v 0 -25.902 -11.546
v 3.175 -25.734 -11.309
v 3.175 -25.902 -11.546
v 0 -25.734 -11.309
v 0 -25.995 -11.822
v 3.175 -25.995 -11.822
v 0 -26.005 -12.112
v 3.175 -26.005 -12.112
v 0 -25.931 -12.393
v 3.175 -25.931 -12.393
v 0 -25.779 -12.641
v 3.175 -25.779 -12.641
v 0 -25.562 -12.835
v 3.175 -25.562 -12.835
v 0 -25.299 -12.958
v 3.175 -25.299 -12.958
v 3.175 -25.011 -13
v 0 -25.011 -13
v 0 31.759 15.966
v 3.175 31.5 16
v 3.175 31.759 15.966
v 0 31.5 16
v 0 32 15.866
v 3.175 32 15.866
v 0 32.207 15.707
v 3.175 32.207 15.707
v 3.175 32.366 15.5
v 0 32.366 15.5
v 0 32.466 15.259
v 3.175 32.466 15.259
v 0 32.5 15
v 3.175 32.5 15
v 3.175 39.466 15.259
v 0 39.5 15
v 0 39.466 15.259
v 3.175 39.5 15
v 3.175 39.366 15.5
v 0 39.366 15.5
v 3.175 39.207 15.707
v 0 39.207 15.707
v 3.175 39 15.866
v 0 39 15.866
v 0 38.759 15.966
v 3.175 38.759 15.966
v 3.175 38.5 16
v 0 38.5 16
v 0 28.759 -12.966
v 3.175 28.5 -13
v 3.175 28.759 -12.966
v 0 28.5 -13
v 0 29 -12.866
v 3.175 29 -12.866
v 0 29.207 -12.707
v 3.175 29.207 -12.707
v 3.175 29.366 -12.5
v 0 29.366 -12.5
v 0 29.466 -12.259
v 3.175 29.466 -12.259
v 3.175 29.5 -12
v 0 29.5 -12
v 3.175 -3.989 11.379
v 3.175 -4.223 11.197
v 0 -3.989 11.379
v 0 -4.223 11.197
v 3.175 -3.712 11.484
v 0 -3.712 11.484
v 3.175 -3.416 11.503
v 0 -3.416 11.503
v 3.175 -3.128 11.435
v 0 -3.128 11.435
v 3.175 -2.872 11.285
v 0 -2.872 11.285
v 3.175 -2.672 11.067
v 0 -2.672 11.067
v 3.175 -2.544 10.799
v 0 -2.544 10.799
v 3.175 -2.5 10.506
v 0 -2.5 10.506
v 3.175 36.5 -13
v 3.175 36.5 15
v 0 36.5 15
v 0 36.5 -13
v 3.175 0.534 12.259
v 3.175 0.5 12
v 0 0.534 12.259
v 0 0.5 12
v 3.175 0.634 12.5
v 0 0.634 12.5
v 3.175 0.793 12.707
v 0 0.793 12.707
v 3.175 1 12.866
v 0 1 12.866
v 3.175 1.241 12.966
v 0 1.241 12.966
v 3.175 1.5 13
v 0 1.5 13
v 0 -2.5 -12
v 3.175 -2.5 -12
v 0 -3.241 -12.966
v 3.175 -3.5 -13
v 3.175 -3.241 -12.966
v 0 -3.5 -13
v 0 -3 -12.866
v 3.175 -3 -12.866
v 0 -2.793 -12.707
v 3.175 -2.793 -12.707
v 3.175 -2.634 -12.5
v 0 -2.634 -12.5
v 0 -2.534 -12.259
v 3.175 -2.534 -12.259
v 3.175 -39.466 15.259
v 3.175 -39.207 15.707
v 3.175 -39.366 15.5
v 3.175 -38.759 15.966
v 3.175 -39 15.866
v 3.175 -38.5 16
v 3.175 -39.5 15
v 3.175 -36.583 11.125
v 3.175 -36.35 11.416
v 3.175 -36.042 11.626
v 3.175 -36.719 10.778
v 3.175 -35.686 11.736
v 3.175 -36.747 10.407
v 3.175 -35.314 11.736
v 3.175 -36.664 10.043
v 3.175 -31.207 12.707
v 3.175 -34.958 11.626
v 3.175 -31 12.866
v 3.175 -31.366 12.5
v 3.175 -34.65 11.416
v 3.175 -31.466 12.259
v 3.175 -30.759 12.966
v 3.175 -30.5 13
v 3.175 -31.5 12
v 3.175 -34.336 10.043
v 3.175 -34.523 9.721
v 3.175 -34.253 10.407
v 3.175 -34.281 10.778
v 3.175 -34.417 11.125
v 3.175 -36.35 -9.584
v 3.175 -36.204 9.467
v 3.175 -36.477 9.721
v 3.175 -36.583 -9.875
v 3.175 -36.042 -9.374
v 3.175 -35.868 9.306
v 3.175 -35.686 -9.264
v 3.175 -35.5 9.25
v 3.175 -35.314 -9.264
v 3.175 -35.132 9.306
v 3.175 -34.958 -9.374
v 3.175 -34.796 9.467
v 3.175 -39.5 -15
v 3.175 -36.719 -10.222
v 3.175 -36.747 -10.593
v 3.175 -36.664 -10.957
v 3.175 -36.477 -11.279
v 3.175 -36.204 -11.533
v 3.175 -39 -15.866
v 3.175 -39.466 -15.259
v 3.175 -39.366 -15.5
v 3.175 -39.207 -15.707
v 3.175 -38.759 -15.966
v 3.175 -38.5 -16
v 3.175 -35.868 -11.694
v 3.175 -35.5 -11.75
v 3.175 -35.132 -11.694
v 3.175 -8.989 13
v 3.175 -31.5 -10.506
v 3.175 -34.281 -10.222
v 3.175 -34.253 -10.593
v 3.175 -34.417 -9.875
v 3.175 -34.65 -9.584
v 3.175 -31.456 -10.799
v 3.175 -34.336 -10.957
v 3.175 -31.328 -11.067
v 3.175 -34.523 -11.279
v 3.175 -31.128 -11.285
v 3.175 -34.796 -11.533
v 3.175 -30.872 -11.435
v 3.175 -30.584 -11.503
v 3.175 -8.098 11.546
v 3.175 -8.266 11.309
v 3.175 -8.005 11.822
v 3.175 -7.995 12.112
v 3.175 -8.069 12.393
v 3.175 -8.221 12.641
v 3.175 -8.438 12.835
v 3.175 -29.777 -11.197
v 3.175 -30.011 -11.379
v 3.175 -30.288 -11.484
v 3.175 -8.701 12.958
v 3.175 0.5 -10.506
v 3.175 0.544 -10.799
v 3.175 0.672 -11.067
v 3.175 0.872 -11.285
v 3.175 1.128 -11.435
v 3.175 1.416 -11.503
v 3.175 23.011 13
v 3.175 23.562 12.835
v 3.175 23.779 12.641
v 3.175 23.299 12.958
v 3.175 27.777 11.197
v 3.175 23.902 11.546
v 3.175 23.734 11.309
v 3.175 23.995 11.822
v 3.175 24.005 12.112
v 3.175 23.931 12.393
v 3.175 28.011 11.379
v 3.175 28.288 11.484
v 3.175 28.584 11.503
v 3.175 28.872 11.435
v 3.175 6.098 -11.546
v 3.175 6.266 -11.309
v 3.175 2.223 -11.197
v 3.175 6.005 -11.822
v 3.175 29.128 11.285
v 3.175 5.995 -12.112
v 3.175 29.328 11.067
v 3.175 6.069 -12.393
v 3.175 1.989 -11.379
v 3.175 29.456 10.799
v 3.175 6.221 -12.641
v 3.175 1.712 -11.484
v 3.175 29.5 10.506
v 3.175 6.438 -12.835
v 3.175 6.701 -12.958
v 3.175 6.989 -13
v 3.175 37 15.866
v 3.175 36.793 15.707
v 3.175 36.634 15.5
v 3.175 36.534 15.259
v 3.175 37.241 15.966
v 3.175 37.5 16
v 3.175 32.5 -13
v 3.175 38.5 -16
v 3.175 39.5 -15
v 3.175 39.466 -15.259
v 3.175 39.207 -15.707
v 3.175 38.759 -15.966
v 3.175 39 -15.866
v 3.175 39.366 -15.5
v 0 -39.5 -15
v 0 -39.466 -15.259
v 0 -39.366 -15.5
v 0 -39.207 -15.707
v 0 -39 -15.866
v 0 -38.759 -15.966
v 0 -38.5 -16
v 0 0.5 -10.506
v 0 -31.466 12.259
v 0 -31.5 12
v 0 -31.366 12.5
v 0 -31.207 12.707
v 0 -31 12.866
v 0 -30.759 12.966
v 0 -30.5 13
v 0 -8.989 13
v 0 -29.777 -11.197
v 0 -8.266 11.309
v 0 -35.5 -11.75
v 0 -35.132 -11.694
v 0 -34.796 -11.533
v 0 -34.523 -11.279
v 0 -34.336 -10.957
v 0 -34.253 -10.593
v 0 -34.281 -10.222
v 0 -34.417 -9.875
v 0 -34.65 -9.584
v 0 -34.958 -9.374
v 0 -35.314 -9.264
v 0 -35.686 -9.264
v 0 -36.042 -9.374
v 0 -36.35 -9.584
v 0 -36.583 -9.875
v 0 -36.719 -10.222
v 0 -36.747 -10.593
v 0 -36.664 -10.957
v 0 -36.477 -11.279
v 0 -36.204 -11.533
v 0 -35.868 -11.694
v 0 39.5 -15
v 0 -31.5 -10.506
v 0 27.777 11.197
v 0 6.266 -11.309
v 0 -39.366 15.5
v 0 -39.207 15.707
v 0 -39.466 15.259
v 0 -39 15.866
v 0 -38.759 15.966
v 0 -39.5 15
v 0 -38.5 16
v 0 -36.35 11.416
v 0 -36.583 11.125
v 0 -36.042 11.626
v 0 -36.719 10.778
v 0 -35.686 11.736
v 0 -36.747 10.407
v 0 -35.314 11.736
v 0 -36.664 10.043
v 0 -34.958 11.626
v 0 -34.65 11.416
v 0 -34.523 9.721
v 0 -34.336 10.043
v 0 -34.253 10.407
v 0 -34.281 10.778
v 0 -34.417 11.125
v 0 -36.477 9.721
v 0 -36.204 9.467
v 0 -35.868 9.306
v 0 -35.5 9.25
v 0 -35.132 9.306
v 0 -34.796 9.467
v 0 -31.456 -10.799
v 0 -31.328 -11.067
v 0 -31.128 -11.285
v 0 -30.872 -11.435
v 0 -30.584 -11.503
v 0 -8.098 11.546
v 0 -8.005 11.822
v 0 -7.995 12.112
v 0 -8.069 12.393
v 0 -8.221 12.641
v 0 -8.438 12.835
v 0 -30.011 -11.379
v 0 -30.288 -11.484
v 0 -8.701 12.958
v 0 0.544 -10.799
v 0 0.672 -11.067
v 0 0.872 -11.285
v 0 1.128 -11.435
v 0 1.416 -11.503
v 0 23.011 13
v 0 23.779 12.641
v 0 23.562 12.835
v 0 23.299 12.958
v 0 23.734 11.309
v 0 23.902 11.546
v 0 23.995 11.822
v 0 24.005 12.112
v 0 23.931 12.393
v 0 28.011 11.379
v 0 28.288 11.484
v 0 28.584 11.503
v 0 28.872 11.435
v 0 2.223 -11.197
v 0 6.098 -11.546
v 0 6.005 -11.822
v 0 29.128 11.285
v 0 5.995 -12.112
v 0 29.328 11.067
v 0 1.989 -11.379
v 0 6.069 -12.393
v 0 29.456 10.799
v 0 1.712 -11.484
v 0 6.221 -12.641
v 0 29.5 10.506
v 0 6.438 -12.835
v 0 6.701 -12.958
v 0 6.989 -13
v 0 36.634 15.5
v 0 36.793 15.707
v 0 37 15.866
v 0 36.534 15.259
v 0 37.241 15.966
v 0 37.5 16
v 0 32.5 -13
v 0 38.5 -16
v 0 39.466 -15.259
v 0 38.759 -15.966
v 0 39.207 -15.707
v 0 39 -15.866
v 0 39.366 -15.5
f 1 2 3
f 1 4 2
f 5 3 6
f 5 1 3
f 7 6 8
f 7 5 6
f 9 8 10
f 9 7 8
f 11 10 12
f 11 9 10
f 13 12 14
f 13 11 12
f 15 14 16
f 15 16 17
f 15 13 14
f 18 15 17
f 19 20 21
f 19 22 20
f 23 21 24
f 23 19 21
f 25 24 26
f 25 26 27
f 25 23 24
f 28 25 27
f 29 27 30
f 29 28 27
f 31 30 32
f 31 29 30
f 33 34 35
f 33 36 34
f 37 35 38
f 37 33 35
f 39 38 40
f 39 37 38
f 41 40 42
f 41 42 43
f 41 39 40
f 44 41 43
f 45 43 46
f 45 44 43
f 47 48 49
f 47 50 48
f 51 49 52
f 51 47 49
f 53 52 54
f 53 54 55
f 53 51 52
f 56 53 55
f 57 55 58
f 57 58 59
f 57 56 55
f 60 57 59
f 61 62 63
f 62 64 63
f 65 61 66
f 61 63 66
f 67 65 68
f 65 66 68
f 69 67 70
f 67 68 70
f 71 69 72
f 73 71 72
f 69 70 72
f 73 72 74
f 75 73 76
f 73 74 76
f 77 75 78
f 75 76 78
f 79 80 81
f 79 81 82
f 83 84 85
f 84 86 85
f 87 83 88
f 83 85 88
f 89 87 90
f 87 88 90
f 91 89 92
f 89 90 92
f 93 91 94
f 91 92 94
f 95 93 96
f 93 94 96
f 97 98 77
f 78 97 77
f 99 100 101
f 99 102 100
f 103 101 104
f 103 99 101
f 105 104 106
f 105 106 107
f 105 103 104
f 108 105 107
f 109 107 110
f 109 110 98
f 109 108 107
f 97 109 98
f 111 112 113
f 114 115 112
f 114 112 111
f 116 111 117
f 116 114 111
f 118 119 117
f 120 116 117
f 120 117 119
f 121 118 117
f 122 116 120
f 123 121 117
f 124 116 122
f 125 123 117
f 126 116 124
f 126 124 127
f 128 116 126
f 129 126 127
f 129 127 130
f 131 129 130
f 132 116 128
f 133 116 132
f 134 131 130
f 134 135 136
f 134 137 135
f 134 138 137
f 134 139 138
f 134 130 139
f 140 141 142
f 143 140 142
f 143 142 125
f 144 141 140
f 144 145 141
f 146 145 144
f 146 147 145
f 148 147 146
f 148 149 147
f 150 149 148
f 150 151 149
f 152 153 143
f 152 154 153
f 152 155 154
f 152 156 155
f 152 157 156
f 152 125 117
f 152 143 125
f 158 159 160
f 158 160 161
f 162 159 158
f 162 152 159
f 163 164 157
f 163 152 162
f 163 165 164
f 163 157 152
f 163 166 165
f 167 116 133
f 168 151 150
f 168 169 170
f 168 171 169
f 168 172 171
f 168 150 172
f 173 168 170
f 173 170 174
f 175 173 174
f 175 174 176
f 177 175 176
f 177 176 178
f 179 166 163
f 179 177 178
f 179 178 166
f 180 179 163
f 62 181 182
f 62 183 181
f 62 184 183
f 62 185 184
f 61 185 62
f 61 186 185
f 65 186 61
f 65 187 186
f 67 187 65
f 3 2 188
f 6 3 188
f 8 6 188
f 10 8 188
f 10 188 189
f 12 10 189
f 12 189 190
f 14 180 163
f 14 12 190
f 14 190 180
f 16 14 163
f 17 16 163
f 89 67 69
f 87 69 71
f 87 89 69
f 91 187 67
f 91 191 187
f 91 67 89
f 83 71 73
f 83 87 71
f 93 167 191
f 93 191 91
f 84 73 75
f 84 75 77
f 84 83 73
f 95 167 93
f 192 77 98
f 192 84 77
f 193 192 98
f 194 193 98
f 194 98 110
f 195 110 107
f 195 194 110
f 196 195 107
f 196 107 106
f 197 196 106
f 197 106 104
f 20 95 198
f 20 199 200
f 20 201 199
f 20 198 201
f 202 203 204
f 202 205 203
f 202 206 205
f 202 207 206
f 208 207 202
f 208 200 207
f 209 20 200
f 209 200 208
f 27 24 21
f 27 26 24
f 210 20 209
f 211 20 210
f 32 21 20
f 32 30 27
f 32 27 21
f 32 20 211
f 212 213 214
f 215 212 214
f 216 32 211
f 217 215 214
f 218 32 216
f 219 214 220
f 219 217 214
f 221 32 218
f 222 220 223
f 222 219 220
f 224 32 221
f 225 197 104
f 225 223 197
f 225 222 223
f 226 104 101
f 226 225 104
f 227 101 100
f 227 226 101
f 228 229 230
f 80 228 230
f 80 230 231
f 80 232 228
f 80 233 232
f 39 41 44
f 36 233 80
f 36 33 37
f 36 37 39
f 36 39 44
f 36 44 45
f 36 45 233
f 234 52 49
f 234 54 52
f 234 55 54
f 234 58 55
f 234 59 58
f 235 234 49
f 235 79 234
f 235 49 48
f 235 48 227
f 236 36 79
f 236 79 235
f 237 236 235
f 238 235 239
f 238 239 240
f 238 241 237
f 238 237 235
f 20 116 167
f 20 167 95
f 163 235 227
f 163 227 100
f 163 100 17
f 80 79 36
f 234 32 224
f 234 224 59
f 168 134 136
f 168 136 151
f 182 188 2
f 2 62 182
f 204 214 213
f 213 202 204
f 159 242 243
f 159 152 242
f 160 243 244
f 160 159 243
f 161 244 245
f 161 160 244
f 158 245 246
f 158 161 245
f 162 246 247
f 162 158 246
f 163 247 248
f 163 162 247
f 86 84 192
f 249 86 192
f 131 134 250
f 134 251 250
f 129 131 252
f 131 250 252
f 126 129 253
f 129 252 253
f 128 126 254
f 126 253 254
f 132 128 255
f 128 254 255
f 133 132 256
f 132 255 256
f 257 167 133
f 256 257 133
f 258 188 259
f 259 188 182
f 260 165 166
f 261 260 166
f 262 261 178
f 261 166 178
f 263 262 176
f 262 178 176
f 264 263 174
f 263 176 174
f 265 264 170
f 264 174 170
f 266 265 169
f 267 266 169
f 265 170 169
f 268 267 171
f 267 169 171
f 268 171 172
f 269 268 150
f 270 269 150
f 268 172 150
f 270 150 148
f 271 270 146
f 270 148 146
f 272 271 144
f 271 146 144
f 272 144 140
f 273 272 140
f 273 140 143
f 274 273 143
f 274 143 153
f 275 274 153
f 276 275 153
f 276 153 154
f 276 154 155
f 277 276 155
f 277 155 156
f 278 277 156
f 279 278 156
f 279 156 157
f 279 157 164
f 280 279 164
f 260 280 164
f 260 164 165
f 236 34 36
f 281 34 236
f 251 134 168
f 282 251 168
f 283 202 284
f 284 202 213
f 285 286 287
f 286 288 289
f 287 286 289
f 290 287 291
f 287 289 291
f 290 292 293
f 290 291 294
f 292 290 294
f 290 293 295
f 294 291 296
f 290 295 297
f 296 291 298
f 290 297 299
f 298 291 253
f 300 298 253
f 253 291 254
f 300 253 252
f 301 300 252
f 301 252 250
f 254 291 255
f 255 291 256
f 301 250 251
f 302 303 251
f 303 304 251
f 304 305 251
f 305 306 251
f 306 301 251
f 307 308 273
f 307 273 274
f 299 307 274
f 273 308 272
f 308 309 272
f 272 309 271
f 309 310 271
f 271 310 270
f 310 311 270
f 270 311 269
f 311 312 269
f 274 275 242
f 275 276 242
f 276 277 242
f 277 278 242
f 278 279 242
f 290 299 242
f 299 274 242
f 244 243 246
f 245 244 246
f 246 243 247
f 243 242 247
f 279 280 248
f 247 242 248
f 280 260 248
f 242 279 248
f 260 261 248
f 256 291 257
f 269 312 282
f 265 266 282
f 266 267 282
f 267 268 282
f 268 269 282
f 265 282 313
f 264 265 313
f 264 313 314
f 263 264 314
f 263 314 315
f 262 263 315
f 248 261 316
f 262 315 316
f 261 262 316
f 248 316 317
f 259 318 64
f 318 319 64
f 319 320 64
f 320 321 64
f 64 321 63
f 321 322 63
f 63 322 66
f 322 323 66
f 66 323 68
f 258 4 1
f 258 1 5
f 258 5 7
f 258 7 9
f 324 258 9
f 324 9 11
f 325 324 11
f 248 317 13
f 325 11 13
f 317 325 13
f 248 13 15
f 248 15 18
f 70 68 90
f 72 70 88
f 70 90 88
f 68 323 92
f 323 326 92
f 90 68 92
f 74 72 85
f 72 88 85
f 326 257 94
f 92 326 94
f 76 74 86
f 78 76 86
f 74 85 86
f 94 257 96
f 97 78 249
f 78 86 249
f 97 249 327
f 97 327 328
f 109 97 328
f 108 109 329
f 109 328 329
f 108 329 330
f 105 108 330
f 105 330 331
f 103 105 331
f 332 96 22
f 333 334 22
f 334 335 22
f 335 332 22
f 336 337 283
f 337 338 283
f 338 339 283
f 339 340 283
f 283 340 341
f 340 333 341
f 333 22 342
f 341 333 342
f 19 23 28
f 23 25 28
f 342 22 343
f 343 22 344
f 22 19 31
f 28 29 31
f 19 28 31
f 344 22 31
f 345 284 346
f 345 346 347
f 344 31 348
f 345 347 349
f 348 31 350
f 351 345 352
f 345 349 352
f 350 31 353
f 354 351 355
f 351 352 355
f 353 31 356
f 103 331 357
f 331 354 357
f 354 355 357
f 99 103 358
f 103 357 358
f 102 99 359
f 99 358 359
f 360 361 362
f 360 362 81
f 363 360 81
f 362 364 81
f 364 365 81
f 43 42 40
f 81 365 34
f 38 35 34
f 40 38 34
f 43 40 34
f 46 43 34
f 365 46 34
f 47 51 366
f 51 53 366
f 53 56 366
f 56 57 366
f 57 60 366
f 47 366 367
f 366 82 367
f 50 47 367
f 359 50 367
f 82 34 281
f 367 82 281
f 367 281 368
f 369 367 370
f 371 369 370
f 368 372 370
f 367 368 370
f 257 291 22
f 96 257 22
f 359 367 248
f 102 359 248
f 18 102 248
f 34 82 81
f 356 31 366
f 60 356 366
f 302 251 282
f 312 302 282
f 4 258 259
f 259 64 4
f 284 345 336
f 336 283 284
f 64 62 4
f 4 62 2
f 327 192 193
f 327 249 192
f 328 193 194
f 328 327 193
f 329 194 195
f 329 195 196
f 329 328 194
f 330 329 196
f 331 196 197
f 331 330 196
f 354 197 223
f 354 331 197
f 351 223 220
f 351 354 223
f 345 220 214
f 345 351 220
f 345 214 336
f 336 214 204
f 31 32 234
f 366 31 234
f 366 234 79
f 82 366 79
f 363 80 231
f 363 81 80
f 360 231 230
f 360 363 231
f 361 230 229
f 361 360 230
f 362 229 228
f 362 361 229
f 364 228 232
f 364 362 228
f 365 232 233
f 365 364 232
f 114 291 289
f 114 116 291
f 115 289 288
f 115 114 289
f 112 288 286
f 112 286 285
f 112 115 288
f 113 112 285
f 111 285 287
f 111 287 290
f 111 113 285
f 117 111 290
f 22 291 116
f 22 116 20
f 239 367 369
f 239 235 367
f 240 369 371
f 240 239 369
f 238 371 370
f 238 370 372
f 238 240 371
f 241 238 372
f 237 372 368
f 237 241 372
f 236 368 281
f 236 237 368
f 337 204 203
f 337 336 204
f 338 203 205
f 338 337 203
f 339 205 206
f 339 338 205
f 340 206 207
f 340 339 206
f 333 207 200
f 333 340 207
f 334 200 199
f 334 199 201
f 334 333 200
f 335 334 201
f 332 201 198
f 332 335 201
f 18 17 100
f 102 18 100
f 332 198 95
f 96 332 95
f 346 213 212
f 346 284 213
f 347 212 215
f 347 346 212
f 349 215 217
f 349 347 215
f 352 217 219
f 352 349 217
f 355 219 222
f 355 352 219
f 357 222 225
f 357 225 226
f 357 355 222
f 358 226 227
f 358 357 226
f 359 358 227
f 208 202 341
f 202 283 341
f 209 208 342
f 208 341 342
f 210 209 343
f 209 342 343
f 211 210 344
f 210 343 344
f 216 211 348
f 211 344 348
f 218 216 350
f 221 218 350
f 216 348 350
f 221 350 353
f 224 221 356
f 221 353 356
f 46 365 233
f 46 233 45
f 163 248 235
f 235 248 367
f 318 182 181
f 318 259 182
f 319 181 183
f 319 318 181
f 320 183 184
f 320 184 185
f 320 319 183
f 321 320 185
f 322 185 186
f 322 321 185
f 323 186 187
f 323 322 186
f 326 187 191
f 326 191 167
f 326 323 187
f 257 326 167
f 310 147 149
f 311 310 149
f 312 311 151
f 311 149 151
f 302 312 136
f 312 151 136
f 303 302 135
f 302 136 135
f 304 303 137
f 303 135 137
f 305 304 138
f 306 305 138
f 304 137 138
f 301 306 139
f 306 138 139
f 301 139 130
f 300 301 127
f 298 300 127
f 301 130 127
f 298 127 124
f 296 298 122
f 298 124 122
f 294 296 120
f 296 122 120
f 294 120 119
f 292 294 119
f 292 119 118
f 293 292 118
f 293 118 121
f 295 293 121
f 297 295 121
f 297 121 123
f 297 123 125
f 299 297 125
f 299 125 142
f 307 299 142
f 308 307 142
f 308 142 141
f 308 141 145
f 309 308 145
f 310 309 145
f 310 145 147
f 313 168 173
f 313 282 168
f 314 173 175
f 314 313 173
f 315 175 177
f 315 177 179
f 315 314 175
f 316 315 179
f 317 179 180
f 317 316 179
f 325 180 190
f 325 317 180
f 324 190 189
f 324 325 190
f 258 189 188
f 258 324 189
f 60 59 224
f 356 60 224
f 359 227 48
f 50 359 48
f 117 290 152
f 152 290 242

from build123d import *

# Parameters (mm, degrees)
SKETCH1_W             = 32
SKETCH1_H             = 79
BOSS_EXTRUDE1_DEPTH   = 3.175
SKETCH2_W             = 29
SKETCH2_H             = 4
CUT_EXTRUDE1_DEPTH    = 3.175
F_2_5MM_DOWEL_HOLE1_D = 2.5
CUT_EXTRUDE2_DEPTH    = 3.175
FILLET2_R             = 1
FILLET3_R             = 1


with BuildPart() as part:
    # Sketch1 → Boss-Extrude1 (new body)
    with BuildSketch(Plane(origin=(0, 0, 0), x_dir=(0, 0, -1), z_dir=(1, 0, 0))):
        Rectangle(SKETCH1_W, SKETCH1_H)
    extrude(amount=BOSS_EXTRUDE1_DEPTH)

    # Sketch2 → Cut-Extrude1 (cut)
    with BuildSketch(Plane(origin=(3.175, 0, 0), x_dir=(0, 0, -1), z_dir=(1, 0, 0))):
        with Locations((-1.5, 34.5)):
            Rectangle(SKETCH2_W, SKETCH2_H)
    extrude(amount=-CUT_EXTRUDE1_DEPTH, mode=Mode.SUBTRACT)

    # Ø2.5mm Dowel Hole1 (through all)
    with Locations(Plane.ZY):
        with Locations((-10.5, -35.5), (10.5, -35.5)):
            Hole(F_2_5MM_DOWEL_HOLE1_D / 2)

    # Sketch8 → Cut-Extrude2 (cut)
    with BuildSketch(Plane(origin=(3.175, 0, 0), x_dir=(0, 0, -1), z_dir=(1, 0, 0))):
        Polygon((-13, -31.5), (13, -31.5), (-13, -6.649883213), align=None)
        Polygon((-13, -2.5), (13, -27.350116787), (13, -2.5), align=None)
        Polygon((-13, 0.5), (13, 0.5), (-13, 25.350116787), align=None)
        Polygon((-13, 29.5), (13, 4.649883213), (13, 29.5), align=None)
    extrude(amount=-CUT_EXTRUDE2_DEPTH, mode=Mode.SUBTRACT)

    # Fillet2
    fillet2_edges = [part.edges().sort_by_distance(p)[0] for p in [
        (1.5875, 32.5, 16),
        (1.5875, 36.5, 16),
        (1.5875, -39.5, -16),
        (1.5875, -39.5, 16),
        (1.5875, 39.5, 16),
        (1.5875, 39.5, -16),
    ]]
    fillet(fillet2_edges, radius=FILLET2_R)

    # Fillet3
    fillet3_edges = [part.edges().sort_by_distance(p)[0] for p in [
        (1.5875, -2.5, -13),
        (1.5875, -27.350116787, -13),
        (1.5875, -2.5, 13),
        (1.5875, 0.5, 13),
        (1.5875, 25.350116787, 13),
        (1.5875, 0.5, -13),
        (1.5875, 29.5, -13),
        (1.5875, 4.649883213, -13),
        (1.5875, 29.5, 13),
        (1.5875, -31.5, 13),
        (1.5875, -6.649883213, 13),
        (1.5875, -31.5, -13),
    ]]
    fillet(fillet3_edges, radius=FILLET3_R)


solid = part.part
